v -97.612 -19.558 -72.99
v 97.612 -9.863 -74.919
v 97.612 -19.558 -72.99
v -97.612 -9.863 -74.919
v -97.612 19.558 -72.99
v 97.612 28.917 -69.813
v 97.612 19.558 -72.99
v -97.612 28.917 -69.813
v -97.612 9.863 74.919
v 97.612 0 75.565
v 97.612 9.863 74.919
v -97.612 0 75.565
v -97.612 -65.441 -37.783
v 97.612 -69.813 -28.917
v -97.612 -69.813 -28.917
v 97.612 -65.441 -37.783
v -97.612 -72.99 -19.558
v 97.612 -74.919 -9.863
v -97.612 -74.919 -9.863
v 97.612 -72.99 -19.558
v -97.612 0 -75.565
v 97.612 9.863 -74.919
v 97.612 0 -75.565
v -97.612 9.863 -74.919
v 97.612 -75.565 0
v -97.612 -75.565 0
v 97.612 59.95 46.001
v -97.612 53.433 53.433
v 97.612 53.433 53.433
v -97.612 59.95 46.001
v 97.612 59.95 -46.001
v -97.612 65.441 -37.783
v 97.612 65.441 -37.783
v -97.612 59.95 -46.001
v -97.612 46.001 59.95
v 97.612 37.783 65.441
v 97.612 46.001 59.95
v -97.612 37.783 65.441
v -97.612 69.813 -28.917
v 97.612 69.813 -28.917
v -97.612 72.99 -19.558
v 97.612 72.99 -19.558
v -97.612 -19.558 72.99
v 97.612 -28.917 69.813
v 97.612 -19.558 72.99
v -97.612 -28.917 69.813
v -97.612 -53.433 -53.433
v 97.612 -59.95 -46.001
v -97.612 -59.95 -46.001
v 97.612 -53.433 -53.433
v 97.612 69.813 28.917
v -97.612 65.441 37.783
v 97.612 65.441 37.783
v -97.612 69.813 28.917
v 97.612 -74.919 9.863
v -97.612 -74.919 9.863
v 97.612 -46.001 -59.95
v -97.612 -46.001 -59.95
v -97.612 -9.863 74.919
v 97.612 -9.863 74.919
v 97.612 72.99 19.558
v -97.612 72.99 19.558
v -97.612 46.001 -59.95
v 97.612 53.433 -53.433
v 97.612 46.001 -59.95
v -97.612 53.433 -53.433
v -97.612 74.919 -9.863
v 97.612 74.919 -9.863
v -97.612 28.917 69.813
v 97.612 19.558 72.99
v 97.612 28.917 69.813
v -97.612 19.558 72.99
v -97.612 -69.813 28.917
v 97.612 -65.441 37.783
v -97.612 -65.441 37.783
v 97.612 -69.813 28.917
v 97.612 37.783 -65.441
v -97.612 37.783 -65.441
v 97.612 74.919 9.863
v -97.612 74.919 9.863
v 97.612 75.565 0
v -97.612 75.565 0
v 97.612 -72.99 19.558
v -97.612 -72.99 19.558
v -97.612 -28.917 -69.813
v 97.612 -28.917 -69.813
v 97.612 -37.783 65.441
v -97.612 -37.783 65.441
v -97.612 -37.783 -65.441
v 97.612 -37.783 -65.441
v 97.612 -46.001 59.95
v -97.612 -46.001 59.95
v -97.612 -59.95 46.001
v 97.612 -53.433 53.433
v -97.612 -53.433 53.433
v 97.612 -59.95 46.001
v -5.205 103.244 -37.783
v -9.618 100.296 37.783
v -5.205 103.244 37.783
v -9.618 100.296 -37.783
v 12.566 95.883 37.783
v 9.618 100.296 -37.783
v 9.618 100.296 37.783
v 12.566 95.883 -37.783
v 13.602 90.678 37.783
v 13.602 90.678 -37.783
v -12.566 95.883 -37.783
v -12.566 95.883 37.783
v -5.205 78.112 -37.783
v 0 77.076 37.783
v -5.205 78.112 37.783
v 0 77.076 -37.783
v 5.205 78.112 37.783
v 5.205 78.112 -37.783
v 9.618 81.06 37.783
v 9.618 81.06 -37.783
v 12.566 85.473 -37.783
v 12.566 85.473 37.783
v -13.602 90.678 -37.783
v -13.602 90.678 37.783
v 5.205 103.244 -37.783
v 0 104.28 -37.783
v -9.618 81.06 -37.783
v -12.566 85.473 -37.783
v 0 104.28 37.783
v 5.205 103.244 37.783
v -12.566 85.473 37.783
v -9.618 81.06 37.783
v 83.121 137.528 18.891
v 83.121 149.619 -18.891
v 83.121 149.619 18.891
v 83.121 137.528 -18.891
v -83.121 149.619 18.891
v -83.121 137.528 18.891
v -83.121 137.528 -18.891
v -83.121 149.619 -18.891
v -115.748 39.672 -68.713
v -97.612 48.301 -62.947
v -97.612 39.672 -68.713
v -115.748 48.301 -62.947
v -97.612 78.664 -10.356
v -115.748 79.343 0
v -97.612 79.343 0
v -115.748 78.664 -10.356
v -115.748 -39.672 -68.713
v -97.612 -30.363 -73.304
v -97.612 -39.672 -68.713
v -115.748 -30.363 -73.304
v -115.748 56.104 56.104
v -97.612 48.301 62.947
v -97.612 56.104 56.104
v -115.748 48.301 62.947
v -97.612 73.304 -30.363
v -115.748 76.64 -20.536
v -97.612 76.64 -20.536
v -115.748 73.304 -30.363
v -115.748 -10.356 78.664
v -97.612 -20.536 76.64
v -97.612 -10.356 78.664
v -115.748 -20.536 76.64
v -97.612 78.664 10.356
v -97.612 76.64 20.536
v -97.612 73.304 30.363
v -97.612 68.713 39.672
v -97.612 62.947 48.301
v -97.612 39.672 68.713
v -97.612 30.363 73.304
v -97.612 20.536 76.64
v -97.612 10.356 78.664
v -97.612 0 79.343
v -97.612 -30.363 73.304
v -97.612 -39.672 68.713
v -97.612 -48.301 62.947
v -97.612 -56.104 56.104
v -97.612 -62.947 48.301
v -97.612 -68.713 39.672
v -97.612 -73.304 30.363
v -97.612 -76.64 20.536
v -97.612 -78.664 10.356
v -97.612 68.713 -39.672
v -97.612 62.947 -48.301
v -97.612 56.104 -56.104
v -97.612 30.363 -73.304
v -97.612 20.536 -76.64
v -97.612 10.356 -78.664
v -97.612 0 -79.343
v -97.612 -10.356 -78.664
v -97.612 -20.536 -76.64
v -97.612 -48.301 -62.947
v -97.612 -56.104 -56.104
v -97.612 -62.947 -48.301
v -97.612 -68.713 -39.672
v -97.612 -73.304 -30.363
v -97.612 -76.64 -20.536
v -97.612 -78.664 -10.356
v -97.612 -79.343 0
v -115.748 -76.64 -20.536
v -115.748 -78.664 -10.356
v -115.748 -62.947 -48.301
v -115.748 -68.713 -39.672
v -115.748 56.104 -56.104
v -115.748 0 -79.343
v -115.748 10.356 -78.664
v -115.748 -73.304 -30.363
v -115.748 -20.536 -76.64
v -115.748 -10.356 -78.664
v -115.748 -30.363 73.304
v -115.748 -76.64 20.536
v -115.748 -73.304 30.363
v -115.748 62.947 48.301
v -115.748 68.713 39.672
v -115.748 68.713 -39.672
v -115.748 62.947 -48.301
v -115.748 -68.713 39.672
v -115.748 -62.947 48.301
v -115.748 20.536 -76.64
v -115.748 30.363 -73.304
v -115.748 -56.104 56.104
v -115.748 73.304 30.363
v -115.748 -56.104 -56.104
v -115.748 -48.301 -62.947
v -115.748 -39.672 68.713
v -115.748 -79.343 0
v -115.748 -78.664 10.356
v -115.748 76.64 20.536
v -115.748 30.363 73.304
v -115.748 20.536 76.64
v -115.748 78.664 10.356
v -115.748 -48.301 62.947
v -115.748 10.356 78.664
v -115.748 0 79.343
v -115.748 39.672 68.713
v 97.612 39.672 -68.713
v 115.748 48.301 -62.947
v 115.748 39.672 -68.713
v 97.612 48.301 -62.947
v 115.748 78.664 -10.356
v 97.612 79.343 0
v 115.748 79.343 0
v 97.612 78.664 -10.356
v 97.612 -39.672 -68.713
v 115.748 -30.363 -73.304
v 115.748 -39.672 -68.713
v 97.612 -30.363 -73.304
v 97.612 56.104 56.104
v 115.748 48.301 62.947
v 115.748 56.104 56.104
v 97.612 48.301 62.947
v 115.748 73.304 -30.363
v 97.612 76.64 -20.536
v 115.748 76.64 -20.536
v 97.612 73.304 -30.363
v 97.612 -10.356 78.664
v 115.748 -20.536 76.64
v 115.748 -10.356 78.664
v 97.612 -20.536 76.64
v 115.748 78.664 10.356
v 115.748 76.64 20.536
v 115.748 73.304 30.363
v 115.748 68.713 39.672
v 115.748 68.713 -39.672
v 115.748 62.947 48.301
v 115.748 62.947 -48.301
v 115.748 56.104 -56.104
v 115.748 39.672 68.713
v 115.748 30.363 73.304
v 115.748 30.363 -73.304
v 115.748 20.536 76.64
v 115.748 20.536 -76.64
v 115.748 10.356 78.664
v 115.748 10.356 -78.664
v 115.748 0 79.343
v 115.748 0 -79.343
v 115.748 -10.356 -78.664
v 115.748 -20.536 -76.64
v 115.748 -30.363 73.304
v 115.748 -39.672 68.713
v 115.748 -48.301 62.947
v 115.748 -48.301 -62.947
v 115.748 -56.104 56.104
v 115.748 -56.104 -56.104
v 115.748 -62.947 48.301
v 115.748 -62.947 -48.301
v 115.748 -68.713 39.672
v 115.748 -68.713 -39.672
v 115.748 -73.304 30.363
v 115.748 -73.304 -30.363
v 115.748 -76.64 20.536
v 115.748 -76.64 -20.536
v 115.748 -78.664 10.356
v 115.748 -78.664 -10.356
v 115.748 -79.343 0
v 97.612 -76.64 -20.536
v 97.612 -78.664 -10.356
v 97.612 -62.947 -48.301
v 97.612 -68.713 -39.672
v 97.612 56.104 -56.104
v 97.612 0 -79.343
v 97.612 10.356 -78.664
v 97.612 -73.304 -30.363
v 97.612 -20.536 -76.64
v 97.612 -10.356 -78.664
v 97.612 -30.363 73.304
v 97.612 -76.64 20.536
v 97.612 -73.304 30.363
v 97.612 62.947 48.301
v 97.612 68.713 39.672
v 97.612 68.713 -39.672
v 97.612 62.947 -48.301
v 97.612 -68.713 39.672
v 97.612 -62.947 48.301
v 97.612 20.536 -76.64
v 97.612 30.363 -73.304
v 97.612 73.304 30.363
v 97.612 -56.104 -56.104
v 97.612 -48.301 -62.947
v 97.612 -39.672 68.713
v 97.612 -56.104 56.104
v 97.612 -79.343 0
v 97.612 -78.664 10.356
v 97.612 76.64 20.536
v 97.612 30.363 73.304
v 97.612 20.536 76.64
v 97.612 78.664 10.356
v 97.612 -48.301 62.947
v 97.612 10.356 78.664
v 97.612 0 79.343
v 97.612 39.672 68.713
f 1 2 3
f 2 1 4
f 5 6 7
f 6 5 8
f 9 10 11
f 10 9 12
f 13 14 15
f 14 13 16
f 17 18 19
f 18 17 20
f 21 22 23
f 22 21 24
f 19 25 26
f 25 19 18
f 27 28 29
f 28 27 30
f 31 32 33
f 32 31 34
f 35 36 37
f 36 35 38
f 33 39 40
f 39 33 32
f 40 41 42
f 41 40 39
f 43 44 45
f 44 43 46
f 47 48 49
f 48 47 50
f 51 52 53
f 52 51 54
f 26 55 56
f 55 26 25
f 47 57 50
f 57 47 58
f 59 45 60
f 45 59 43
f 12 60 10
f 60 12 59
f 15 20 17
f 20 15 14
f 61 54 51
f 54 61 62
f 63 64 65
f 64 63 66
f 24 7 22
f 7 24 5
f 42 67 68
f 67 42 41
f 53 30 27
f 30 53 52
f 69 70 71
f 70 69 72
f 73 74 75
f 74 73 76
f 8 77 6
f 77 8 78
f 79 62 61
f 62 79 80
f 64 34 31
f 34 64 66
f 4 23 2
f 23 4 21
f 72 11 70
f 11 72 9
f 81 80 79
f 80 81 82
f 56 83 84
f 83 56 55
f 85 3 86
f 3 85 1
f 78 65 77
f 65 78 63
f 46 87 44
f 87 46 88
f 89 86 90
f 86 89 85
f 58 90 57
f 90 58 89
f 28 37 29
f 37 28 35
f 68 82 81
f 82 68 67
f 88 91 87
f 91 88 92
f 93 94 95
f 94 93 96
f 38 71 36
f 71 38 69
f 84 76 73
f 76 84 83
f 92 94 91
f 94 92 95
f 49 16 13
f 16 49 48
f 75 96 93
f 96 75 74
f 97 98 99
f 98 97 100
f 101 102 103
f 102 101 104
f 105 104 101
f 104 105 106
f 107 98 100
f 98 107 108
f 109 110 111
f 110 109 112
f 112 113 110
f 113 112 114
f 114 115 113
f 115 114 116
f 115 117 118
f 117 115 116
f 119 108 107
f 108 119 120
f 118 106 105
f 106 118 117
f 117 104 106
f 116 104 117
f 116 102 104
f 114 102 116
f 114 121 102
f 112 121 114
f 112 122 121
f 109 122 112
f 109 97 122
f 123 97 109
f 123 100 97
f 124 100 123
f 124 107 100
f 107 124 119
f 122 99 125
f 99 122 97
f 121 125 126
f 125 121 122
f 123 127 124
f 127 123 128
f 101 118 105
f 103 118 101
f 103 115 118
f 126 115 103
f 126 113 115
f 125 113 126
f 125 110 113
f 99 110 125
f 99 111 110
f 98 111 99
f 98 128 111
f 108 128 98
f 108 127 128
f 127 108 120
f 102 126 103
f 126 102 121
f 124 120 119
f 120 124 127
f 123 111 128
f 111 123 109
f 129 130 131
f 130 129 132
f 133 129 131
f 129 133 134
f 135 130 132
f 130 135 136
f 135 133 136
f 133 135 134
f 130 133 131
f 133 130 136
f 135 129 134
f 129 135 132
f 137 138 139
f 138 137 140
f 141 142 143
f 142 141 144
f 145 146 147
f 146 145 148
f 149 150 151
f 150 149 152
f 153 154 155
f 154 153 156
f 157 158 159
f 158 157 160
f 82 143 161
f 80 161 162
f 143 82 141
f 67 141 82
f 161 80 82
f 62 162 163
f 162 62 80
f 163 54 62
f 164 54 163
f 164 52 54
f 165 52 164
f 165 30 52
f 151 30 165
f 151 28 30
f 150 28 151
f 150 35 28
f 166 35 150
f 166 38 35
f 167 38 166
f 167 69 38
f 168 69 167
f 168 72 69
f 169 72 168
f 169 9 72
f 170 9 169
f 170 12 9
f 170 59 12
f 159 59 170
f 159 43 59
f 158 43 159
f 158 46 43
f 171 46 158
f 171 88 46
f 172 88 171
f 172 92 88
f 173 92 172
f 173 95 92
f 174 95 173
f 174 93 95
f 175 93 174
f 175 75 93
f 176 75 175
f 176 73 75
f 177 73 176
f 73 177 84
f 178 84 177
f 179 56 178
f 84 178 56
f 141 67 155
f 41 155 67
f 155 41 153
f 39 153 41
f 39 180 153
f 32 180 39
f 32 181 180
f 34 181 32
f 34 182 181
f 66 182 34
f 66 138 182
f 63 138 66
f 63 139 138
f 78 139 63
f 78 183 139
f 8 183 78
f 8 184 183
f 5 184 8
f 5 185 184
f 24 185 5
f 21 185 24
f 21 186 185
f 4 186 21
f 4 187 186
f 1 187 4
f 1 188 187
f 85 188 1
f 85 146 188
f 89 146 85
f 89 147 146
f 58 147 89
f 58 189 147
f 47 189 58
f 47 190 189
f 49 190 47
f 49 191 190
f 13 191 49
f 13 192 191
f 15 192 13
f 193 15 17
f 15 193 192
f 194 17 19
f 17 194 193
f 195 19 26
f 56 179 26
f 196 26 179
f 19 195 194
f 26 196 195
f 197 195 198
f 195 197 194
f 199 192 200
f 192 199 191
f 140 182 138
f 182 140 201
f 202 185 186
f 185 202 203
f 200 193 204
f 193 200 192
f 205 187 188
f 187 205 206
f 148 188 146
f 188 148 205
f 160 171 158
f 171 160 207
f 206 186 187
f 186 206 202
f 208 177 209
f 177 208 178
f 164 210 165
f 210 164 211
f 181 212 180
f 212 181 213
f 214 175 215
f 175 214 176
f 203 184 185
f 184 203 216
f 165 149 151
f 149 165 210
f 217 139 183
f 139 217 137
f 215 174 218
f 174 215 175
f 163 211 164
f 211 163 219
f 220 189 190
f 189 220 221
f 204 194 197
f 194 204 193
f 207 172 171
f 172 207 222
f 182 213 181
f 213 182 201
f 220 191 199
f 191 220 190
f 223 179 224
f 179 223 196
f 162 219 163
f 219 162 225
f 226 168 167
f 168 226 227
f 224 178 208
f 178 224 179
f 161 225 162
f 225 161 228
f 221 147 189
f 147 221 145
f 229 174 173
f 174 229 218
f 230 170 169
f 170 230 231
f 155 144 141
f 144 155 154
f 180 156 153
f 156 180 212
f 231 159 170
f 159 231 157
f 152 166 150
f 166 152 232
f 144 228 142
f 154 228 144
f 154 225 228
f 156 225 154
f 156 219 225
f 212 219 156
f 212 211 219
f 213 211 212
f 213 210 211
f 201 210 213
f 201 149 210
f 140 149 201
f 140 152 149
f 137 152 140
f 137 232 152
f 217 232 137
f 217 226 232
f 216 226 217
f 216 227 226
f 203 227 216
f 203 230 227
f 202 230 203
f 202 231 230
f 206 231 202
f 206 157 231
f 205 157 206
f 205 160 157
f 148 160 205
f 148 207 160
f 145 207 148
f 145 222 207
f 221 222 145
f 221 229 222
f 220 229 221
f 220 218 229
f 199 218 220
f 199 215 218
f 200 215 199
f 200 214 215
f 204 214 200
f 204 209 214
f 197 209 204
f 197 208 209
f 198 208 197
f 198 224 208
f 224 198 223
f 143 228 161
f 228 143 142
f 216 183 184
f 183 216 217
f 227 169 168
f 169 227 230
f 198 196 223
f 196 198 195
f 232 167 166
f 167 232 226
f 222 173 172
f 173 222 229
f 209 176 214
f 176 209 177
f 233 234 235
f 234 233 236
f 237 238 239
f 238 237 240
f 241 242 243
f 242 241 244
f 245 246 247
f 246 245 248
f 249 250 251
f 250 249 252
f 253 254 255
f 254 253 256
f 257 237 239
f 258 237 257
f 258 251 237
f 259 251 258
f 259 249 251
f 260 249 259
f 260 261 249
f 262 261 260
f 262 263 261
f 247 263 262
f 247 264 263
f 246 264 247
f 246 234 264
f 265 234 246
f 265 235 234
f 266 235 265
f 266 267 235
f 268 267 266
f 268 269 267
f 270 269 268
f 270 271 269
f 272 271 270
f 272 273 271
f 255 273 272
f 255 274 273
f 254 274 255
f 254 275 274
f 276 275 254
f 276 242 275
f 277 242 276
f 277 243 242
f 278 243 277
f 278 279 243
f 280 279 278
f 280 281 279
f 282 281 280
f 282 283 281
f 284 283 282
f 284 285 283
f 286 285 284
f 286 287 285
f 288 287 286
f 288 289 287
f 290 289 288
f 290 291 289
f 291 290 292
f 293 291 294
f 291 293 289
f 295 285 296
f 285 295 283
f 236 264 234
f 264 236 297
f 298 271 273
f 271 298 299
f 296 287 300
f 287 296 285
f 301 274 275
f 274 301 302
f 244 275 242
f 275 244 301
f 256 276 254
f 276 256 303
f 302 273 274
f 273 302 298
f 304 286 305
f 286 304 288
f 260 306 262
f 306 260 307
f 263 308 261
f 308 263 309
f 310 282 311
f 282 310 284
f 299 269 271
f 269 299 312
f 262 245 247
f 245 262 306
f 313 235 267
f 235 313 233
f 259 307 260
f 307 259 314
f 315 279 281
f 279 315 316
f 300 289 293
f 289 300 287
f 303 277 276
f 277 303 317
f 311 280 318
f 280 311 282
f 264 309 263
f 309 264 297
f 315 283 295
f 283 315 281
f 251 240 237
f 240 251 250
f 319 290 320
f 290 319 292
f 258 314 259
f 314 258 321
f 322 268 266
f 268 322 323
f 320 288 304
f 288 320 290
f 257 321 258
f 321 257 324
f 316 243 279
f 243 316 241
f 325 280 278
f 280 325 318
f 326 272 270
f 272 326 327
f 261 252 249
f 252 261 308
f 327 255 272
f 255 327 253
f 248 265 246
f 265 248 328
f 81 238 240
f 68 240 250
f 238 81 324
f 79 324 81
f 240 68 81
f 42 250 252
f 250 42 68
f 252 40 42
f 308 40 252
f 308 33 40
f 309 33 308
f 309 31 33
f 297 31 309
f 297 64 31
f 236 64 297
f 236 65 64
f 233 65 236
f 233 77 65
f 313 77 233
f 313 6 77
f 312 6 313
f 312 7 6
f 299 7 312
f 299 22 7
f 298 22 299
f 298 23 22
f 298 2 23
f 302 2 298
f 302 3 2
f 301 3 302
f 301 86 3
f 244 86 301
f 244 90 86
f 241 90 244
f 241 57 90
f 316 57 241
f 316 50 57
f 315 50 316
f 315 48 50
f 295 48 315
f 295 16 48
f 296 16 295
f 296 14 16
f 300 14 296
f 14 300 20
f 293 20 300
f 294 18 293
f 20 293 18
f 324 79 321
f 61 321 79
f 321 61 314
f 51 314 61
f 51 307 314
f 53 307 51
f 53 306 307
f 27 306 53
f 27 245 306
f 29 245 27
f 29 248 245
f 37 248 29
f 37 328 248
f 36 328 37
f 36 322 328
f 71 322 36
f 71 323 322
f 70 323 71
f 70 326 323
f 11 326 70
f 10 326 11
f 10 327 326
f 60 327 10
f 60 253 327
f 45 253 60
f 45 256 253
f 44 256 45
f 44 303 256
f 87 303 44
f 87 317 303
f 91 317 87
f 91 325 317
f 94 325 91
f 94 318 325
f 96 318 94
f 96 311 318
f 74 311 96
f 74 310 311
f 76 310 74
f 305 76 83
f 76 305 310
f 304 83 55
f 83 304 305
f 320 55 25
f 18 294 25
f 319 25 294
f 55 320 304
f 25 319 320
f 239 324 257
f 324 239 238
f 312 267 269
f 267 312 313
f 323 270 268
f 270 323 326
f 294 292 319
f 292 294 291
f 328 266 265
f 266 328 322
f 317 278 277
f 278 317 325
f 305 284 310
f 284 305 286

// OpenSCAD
// Auto-generated by scripts/author_from_manifest.py (Phase D.3).
// Source: data/phase_d_manifest.json (sku_intent='reliable-model-dv-deluge-3in').
// Do not hand-edit — regenerate from the manifest.
//
// @part reliable_model_dv_deluge_3in
// @kind valve
// @category valve.deluge
// @display-name "Reliable Model DV Deluge Valve 3\""
// @mfg reliable_automatic_sprinkler
// @mfg-pn Model_DV
// @listing UL FM
// @price-usd 1340.00
// @install-minutes 75
// @crew foreman
// @param size_in number default=3 label="Size" unit="in"
// @port inlet position=[-0.05,0,0] direction=[-1,0,0] style=grooved size_in=3 role=run_a
// @port outlet position=[0.05,0,0] direction=[1,0,0] style=grooved size_in=3 role=run_b

size_in = 3.0;

function od_mm(nps) =
    nps ==   1  ? 33.4 :
    nps == 1.25 ? 42.2 :
    nps == 1.5  ? 48.3 :
    nps ==   2  ? 60.3 :
    nps == 2.5  ? 73.0 :
    nps ==   3  ? 88.9 :
    nps ==   4  ? 114.3 :
    nps ==   6  ? 168.3 :
    nps ==   8  ? 219.1 : 73.0;

od = od_mm(size_in);
body_len = od * 2.4;
body_d   = od * 1.7;

union() {
    // Valve body
    rotate([0, 90, 0])
        cylinder(h = body_len, d = body_d, center = true, $fn = 48);
    // Stem / handle indicator
    translate([0, body_d * 0.6, 0])
        cylinder(h = body_d * 0.5, d = body_d * 0.18, center = true, $fn = 16);
    translate([0, body_d * 0.95, 0])
        cube([body_d * 1.1, body_d * 0.08, body_d * 0.25], center = true);
    // End flanges
    translate([-body_len/2, 0, 0])
        rotate([0, 90, 0])
        cylinder(h = body_d * 0.12, d = body_d * 1.05, center = true, $fn = 48);
    translate([ body_len/2, 0, 0])
        rotate([0, 90, 0])
        cylinder(h = body_d * 0.12, d = body_d * 1.05, center = true, $fn = 48);
}
